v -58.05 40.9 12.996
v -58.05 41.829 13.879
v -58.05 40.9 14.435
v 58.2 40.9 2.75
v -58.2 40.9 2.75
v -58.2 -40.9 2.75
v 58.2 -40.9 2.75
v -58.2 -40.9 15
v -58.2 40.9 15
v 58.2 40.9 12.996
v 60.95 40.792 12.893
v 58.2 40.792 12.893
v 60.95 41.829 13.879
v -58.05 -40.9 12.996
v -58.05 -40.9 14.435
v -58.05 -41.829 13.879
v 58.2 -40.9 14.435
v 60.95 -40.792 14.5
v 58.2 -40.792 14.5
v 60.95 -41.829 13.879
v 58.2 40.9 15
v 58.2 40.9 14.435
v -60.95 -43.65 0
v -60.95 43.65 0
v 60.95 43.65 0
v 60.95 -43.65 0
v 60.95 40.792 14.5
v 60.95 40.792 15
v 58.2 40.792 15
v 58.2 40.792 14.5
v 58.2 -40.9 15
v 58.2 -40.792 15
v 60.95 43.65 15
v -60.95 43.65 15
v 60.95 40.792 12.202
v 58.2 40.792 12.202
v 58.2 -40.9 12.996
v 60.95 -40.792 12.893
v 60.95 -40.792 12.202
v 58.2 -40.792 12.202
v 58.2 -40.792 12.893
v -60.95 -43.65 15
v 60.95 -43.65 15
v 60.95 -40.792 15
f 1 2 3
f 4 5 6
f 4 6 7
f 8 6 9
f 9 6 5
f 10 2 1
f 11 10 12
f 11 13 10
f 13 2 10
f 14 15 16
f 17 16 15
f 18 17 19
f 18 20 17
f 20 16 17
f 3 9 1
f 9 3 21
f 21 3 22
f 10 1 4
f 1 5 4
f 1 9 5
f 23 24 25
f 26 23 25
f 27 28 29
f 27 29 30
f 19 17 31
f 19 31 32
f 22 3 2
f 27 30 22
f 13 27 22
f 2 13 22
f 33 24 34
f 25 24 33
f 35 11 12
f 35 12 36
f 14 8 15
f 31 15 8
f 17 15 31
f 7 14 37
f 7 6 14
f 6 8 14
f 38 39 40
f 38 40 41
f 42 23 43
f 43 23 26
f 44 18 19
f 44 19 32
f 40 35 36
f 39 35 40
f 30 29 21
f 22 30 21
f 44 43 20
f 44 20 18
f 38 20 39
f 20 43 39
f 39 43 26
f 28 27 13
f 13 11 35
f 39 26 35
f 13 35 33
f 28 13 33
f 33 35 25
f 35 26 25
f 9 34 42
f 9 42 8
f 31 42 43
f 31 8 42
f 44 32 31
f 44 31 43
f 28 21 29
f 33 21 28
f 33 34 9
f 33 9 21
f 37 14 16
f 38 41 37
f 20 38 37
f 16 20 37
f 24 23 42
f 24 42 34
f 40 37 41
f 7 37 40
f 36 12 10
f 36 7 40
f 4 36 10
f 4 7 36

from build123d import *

# Parameters (mm, degrees)
F0_W     = 108.9
F0_H     = 76.3
F1_DEPTH = 15
F2_W     = 121.9
F2_H     = 87.3
F3_DEPTH = 15
F4_T     = -2.75
F7_DEPTH = 119


with BuildPart() as f1:
    # F0 (on Top) → F1 (new body)
    with BuildSketch(Plane.XY):
        Rectangle(F0_W, F0_H)
    extrude(amount=F1_DEPTH)

    # F2 (on Top) → F3 (join)
    with BuildSketch(Plane.XY):
        Rectangle(F2_W, F2_H)
    extrude(amount=F3_DEPTH)

    # F4
    f4_openings = [f1.faces().sort_by_distance(p)[0] for p in [
        (0, 0, 15),
    ]]
    offset(amount=F4_T, openings=f4_openings)

    # F6 (on face) → F7 (cut)
    with BuildSketch(Plane(origin=(60.95, 0, 0), x_dir=(0, -1, 0), z_dir=(-1, 0, 0))):
        Polygon((40.792018, 14.5), (40.792018, 15), (-40.792018, 15), (-40.792018, 14.5), (-41.829281, 13.878562), (-40.792018, 12.893027), (-40.792018, 12.20222), (40.792018, 12.20222), (40.792018, 12.893027), (41.829281, 13.878562), align=None)
    extrude(amount=F7_DEPTH, mode=Mode.SUBTRACT)


solid = f1.part
